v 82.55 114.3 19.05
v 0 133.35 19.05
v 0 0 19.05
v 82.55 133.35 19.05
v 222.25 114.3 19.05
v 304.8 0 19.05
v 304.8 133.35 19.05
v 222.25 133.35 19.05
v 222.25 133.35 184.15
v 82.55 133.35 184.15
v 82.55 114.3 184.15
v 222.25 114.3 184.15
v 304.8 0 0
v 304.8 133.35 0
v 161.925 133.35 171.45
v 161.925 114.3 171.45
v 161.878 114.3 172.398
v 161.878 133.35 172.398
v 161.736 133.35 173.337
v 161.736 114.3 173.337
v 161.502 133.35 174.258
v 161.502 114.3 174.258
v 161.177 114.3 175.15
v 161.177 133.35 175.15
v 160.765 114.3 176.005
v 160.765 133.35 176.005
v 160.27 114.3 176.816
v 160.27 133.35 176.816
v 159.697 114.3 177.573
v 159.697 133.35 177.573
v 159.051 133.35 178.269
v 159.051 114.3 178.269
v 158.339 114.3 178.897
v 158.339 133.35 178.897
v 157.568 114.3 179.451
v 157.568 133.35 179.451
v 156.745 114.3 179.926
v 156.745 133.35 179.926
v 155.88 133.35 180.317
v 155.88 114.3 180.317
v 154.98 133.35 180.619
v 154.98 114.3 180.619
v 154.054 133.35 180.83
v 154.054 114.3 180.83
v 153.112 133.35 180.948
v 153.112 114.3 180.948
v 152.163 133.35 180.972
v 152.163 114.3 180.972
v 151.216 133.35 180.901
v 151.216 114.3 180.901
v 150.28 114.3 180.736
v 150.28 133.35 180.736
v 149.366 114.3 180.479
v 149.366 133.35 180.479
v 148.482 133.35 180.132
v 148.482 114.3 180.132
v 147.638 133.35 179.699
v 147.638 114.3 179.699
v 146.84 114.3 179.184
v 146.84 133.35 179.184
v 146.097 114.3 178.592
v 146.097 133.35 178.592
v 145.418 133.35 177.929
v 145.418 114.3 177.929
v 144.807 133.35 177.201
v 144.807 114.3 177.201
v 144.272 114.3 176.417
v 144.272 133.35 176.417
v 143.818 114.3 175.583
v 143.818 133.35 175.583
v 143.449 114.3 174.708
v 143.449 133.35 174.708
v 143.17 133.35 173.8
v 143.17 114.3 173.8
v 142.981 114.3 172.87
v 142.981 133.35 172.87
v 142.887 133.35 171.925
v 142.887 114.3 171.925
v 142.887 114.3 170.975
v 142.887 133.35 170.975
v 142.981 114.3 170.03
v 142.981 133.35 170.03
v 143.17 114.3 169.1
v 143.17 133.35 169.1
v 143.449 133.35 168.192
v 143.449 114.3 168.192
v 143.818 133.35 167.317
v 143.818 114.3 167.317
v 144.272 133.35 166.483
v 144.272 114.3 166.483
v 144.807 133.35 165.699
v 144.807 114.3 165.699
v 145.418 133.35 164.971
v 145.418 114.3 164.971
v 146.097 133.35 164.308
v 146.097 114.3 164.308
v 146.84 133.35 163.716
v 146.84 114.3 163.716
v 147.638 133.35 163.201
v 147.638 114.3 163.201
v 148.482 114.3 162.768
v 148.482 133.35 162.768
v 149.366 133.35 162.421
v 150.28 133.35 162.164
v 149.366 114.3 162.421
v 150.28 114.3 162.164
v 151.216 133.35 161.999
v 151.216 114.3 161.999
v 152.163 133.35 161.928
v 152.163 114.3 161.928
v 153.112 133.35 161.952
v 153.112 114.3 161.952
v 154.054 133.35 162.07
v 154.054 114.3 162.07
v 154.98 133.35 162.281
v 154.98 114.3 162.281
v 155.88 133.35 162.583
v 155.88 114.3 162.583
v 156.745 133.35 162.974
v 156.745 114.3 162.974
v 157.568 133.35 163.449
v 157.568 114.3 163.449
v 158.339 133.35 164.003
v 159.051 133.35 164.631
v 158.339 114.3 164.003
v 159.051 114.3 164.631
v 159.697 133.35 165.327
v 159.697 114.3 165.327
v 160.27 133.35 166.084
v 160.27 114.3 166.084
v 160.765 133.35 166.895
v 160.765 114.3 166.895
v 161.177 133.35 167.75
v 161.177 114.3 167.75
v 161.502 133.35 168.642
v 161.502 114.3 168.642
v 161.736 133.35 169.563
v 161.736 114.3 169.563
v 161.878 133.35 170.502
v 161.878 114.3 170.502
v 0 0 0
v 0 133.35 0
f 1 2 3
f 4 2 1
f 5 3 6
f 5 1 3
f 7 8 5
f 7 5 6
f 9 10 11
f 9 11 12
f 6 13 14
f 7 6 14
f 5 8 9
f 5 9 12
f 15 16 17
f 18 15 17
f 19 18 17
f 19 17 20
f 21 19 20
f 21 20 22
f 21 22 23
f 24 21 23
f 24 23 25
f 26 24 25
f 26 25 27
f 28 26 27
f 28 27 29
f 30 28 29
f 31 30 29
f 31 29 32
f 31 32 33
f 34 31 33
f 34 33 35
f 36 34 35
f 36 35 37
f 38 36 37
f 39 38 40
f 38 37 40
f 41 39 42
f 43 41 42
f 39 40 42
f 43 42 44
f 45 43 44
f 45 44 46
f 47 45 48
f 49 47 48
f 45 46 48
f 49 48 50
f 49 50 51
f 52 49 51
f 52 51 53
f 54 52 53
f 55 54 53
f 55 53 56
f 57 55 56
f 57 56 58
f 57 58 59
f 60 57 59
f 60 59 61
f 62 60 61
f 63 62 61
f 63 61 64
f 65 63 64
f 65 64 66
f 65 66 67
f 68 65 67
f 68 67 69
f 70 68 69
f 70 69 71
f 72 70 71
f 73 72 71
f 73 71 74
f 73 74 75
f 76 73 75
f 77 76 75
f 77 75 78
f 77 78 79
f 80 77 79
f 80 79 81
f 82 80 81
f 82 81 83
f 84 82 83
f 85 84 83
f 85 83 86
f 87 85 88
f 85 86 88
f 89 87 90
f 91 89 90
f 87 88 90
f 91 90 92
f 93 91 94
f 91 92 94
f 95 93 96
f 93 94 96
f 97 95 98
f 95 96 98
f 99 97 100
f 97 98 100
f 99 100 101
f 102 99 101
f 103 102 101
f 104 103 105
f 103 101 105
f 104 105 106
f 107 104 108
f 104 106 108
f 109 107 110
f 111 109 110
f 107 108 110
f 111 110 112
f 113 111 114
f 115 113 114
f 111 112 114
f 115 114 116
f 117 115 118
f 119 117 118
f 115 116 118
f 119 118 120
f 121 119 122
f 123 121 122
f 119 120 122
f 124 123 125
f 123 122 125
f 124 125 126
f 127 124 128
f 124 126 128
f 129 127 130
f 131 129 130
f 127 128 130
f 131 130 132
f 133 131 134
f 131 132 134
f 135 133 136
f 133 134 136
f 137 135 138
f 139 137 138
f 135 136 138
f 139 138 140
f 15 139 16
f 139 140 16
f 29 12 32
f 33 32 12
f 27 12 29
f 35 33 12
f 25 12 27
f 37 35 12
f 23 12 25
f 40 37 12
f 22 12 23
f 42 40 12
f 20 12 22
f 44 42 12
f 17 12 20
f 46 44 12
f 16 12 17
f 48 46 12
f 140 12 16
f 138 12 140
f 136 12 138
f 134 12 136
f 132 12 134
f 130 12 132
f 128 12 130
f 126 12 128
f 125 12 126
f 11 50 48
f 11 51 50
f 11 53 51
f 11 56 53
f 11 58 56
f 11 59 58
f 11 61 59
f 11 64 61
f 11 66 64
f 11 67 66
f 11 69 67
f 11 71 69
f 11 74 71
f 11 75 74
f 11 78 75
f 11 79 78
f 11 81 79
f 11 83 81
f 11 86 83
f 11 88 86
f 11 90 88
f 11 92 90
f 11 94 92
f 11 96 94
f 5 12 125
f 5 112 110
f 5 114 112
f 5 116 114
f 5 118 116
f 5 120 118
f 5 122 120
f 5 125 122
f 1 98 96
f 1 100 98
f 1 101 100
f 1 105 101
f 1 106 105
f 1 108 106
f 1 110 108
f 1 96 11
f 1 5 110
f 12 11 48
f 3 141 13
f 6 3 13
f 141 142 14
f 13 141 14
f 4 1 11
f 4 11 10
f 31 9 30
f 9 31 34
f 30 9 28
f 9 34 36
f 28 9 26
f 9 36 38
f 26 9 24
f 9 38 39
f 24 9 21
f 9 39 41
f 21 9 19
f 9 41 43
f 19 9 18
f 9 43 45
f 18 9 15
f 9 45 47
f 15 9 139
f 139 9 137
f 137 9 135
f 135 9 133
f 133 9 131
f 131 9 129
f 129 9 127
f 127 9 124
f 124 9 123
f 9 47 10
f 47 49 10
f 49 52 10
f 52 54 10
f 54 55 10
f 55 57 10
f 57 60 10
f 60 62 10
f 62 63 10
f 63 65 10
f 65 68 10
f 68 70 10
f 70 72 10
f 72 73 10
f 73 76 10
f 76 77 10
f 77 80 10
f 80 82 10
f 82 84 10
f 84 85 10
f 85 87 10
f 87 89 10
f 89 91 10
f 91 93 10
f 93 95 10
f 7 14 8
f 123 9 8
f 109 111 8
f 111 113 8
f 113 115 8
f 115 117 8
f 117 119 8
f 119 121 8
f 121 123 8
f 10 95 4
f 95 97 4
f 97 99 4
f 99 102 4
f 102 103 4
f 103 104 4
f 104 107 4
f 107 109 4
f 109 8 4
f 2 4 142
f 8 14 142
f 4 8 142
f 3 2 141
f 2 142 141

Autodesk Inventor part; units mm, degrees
ref_plane "YZ Plane" through (0, 0, 0) normal (1, 0, 0) x (0, 1, 0)
ref_plane "XZ Plane" through (0, 0, 0) normal (0, 1, 0) x (-1, 0, 0)
ref_plane "XY Plane" through (0, 0, 0) normal (0, 0, 1) x (1, 0, 0)
sketch "Sketch1" plane through (0, 0, 0) normal (0, 0, 1) x (1, 0, 0)
  line L0 (0, 0) -> (304.8, 0)
  line L1 (304.8, 0) -> (304.8, 133.35)
  line L2 (304.8, 133.35) -> (0, 133.35)
  line L3 (0, 133.35) -> (0, 0)
  dimension "d0" = 304.8
  dimension "d1" = 133.35
extrude "Extrusion1" add sketch "Sketch1" along normal blind 19.05
sketch "Sketch2" plane through (0, 0, 19.05) normal (0, 0, 1) x (1, 0, 0)
  line L0 (304.8, 133.35) -> (0, 133.35) projected
  line L1 (0, 133.35) -> (0, 0) projected
  line L2 (82.55, 133.35) -> (222.25, 133.35)
  line L3 (222.25, 133.35) -> (222.25, 114.3)
  line L4 (222.25, 114.3) -> (82.55, 114.3)
  line L5 (82.55, 114.3) -> (82.55, 133.35)
  dimension "d4" = 139.7
  dimension "d5" = 19.05
  dimension "d6" = 82.55
extrude "Extrusion2" add sketch "Sketch2" along normal blind 165.1
sketch "Sketch3" plane through (82.55, 114.3, 19.05) normal (0, -1, 0) x (1, 0, 0)
  line L0 (0, 165.1) -> (139.7, 165.1) projected
  circle A0 centre (69.85, 152.4) radius 9.525
  point P0 (-82.55, -19.05)
  dimension "d9" = 19.05
  dimension "d10" = 12.7
extrude "Extrusion3" cut sketch "Sketch3" against normal blind 165.1
properties part number "Puller1"
